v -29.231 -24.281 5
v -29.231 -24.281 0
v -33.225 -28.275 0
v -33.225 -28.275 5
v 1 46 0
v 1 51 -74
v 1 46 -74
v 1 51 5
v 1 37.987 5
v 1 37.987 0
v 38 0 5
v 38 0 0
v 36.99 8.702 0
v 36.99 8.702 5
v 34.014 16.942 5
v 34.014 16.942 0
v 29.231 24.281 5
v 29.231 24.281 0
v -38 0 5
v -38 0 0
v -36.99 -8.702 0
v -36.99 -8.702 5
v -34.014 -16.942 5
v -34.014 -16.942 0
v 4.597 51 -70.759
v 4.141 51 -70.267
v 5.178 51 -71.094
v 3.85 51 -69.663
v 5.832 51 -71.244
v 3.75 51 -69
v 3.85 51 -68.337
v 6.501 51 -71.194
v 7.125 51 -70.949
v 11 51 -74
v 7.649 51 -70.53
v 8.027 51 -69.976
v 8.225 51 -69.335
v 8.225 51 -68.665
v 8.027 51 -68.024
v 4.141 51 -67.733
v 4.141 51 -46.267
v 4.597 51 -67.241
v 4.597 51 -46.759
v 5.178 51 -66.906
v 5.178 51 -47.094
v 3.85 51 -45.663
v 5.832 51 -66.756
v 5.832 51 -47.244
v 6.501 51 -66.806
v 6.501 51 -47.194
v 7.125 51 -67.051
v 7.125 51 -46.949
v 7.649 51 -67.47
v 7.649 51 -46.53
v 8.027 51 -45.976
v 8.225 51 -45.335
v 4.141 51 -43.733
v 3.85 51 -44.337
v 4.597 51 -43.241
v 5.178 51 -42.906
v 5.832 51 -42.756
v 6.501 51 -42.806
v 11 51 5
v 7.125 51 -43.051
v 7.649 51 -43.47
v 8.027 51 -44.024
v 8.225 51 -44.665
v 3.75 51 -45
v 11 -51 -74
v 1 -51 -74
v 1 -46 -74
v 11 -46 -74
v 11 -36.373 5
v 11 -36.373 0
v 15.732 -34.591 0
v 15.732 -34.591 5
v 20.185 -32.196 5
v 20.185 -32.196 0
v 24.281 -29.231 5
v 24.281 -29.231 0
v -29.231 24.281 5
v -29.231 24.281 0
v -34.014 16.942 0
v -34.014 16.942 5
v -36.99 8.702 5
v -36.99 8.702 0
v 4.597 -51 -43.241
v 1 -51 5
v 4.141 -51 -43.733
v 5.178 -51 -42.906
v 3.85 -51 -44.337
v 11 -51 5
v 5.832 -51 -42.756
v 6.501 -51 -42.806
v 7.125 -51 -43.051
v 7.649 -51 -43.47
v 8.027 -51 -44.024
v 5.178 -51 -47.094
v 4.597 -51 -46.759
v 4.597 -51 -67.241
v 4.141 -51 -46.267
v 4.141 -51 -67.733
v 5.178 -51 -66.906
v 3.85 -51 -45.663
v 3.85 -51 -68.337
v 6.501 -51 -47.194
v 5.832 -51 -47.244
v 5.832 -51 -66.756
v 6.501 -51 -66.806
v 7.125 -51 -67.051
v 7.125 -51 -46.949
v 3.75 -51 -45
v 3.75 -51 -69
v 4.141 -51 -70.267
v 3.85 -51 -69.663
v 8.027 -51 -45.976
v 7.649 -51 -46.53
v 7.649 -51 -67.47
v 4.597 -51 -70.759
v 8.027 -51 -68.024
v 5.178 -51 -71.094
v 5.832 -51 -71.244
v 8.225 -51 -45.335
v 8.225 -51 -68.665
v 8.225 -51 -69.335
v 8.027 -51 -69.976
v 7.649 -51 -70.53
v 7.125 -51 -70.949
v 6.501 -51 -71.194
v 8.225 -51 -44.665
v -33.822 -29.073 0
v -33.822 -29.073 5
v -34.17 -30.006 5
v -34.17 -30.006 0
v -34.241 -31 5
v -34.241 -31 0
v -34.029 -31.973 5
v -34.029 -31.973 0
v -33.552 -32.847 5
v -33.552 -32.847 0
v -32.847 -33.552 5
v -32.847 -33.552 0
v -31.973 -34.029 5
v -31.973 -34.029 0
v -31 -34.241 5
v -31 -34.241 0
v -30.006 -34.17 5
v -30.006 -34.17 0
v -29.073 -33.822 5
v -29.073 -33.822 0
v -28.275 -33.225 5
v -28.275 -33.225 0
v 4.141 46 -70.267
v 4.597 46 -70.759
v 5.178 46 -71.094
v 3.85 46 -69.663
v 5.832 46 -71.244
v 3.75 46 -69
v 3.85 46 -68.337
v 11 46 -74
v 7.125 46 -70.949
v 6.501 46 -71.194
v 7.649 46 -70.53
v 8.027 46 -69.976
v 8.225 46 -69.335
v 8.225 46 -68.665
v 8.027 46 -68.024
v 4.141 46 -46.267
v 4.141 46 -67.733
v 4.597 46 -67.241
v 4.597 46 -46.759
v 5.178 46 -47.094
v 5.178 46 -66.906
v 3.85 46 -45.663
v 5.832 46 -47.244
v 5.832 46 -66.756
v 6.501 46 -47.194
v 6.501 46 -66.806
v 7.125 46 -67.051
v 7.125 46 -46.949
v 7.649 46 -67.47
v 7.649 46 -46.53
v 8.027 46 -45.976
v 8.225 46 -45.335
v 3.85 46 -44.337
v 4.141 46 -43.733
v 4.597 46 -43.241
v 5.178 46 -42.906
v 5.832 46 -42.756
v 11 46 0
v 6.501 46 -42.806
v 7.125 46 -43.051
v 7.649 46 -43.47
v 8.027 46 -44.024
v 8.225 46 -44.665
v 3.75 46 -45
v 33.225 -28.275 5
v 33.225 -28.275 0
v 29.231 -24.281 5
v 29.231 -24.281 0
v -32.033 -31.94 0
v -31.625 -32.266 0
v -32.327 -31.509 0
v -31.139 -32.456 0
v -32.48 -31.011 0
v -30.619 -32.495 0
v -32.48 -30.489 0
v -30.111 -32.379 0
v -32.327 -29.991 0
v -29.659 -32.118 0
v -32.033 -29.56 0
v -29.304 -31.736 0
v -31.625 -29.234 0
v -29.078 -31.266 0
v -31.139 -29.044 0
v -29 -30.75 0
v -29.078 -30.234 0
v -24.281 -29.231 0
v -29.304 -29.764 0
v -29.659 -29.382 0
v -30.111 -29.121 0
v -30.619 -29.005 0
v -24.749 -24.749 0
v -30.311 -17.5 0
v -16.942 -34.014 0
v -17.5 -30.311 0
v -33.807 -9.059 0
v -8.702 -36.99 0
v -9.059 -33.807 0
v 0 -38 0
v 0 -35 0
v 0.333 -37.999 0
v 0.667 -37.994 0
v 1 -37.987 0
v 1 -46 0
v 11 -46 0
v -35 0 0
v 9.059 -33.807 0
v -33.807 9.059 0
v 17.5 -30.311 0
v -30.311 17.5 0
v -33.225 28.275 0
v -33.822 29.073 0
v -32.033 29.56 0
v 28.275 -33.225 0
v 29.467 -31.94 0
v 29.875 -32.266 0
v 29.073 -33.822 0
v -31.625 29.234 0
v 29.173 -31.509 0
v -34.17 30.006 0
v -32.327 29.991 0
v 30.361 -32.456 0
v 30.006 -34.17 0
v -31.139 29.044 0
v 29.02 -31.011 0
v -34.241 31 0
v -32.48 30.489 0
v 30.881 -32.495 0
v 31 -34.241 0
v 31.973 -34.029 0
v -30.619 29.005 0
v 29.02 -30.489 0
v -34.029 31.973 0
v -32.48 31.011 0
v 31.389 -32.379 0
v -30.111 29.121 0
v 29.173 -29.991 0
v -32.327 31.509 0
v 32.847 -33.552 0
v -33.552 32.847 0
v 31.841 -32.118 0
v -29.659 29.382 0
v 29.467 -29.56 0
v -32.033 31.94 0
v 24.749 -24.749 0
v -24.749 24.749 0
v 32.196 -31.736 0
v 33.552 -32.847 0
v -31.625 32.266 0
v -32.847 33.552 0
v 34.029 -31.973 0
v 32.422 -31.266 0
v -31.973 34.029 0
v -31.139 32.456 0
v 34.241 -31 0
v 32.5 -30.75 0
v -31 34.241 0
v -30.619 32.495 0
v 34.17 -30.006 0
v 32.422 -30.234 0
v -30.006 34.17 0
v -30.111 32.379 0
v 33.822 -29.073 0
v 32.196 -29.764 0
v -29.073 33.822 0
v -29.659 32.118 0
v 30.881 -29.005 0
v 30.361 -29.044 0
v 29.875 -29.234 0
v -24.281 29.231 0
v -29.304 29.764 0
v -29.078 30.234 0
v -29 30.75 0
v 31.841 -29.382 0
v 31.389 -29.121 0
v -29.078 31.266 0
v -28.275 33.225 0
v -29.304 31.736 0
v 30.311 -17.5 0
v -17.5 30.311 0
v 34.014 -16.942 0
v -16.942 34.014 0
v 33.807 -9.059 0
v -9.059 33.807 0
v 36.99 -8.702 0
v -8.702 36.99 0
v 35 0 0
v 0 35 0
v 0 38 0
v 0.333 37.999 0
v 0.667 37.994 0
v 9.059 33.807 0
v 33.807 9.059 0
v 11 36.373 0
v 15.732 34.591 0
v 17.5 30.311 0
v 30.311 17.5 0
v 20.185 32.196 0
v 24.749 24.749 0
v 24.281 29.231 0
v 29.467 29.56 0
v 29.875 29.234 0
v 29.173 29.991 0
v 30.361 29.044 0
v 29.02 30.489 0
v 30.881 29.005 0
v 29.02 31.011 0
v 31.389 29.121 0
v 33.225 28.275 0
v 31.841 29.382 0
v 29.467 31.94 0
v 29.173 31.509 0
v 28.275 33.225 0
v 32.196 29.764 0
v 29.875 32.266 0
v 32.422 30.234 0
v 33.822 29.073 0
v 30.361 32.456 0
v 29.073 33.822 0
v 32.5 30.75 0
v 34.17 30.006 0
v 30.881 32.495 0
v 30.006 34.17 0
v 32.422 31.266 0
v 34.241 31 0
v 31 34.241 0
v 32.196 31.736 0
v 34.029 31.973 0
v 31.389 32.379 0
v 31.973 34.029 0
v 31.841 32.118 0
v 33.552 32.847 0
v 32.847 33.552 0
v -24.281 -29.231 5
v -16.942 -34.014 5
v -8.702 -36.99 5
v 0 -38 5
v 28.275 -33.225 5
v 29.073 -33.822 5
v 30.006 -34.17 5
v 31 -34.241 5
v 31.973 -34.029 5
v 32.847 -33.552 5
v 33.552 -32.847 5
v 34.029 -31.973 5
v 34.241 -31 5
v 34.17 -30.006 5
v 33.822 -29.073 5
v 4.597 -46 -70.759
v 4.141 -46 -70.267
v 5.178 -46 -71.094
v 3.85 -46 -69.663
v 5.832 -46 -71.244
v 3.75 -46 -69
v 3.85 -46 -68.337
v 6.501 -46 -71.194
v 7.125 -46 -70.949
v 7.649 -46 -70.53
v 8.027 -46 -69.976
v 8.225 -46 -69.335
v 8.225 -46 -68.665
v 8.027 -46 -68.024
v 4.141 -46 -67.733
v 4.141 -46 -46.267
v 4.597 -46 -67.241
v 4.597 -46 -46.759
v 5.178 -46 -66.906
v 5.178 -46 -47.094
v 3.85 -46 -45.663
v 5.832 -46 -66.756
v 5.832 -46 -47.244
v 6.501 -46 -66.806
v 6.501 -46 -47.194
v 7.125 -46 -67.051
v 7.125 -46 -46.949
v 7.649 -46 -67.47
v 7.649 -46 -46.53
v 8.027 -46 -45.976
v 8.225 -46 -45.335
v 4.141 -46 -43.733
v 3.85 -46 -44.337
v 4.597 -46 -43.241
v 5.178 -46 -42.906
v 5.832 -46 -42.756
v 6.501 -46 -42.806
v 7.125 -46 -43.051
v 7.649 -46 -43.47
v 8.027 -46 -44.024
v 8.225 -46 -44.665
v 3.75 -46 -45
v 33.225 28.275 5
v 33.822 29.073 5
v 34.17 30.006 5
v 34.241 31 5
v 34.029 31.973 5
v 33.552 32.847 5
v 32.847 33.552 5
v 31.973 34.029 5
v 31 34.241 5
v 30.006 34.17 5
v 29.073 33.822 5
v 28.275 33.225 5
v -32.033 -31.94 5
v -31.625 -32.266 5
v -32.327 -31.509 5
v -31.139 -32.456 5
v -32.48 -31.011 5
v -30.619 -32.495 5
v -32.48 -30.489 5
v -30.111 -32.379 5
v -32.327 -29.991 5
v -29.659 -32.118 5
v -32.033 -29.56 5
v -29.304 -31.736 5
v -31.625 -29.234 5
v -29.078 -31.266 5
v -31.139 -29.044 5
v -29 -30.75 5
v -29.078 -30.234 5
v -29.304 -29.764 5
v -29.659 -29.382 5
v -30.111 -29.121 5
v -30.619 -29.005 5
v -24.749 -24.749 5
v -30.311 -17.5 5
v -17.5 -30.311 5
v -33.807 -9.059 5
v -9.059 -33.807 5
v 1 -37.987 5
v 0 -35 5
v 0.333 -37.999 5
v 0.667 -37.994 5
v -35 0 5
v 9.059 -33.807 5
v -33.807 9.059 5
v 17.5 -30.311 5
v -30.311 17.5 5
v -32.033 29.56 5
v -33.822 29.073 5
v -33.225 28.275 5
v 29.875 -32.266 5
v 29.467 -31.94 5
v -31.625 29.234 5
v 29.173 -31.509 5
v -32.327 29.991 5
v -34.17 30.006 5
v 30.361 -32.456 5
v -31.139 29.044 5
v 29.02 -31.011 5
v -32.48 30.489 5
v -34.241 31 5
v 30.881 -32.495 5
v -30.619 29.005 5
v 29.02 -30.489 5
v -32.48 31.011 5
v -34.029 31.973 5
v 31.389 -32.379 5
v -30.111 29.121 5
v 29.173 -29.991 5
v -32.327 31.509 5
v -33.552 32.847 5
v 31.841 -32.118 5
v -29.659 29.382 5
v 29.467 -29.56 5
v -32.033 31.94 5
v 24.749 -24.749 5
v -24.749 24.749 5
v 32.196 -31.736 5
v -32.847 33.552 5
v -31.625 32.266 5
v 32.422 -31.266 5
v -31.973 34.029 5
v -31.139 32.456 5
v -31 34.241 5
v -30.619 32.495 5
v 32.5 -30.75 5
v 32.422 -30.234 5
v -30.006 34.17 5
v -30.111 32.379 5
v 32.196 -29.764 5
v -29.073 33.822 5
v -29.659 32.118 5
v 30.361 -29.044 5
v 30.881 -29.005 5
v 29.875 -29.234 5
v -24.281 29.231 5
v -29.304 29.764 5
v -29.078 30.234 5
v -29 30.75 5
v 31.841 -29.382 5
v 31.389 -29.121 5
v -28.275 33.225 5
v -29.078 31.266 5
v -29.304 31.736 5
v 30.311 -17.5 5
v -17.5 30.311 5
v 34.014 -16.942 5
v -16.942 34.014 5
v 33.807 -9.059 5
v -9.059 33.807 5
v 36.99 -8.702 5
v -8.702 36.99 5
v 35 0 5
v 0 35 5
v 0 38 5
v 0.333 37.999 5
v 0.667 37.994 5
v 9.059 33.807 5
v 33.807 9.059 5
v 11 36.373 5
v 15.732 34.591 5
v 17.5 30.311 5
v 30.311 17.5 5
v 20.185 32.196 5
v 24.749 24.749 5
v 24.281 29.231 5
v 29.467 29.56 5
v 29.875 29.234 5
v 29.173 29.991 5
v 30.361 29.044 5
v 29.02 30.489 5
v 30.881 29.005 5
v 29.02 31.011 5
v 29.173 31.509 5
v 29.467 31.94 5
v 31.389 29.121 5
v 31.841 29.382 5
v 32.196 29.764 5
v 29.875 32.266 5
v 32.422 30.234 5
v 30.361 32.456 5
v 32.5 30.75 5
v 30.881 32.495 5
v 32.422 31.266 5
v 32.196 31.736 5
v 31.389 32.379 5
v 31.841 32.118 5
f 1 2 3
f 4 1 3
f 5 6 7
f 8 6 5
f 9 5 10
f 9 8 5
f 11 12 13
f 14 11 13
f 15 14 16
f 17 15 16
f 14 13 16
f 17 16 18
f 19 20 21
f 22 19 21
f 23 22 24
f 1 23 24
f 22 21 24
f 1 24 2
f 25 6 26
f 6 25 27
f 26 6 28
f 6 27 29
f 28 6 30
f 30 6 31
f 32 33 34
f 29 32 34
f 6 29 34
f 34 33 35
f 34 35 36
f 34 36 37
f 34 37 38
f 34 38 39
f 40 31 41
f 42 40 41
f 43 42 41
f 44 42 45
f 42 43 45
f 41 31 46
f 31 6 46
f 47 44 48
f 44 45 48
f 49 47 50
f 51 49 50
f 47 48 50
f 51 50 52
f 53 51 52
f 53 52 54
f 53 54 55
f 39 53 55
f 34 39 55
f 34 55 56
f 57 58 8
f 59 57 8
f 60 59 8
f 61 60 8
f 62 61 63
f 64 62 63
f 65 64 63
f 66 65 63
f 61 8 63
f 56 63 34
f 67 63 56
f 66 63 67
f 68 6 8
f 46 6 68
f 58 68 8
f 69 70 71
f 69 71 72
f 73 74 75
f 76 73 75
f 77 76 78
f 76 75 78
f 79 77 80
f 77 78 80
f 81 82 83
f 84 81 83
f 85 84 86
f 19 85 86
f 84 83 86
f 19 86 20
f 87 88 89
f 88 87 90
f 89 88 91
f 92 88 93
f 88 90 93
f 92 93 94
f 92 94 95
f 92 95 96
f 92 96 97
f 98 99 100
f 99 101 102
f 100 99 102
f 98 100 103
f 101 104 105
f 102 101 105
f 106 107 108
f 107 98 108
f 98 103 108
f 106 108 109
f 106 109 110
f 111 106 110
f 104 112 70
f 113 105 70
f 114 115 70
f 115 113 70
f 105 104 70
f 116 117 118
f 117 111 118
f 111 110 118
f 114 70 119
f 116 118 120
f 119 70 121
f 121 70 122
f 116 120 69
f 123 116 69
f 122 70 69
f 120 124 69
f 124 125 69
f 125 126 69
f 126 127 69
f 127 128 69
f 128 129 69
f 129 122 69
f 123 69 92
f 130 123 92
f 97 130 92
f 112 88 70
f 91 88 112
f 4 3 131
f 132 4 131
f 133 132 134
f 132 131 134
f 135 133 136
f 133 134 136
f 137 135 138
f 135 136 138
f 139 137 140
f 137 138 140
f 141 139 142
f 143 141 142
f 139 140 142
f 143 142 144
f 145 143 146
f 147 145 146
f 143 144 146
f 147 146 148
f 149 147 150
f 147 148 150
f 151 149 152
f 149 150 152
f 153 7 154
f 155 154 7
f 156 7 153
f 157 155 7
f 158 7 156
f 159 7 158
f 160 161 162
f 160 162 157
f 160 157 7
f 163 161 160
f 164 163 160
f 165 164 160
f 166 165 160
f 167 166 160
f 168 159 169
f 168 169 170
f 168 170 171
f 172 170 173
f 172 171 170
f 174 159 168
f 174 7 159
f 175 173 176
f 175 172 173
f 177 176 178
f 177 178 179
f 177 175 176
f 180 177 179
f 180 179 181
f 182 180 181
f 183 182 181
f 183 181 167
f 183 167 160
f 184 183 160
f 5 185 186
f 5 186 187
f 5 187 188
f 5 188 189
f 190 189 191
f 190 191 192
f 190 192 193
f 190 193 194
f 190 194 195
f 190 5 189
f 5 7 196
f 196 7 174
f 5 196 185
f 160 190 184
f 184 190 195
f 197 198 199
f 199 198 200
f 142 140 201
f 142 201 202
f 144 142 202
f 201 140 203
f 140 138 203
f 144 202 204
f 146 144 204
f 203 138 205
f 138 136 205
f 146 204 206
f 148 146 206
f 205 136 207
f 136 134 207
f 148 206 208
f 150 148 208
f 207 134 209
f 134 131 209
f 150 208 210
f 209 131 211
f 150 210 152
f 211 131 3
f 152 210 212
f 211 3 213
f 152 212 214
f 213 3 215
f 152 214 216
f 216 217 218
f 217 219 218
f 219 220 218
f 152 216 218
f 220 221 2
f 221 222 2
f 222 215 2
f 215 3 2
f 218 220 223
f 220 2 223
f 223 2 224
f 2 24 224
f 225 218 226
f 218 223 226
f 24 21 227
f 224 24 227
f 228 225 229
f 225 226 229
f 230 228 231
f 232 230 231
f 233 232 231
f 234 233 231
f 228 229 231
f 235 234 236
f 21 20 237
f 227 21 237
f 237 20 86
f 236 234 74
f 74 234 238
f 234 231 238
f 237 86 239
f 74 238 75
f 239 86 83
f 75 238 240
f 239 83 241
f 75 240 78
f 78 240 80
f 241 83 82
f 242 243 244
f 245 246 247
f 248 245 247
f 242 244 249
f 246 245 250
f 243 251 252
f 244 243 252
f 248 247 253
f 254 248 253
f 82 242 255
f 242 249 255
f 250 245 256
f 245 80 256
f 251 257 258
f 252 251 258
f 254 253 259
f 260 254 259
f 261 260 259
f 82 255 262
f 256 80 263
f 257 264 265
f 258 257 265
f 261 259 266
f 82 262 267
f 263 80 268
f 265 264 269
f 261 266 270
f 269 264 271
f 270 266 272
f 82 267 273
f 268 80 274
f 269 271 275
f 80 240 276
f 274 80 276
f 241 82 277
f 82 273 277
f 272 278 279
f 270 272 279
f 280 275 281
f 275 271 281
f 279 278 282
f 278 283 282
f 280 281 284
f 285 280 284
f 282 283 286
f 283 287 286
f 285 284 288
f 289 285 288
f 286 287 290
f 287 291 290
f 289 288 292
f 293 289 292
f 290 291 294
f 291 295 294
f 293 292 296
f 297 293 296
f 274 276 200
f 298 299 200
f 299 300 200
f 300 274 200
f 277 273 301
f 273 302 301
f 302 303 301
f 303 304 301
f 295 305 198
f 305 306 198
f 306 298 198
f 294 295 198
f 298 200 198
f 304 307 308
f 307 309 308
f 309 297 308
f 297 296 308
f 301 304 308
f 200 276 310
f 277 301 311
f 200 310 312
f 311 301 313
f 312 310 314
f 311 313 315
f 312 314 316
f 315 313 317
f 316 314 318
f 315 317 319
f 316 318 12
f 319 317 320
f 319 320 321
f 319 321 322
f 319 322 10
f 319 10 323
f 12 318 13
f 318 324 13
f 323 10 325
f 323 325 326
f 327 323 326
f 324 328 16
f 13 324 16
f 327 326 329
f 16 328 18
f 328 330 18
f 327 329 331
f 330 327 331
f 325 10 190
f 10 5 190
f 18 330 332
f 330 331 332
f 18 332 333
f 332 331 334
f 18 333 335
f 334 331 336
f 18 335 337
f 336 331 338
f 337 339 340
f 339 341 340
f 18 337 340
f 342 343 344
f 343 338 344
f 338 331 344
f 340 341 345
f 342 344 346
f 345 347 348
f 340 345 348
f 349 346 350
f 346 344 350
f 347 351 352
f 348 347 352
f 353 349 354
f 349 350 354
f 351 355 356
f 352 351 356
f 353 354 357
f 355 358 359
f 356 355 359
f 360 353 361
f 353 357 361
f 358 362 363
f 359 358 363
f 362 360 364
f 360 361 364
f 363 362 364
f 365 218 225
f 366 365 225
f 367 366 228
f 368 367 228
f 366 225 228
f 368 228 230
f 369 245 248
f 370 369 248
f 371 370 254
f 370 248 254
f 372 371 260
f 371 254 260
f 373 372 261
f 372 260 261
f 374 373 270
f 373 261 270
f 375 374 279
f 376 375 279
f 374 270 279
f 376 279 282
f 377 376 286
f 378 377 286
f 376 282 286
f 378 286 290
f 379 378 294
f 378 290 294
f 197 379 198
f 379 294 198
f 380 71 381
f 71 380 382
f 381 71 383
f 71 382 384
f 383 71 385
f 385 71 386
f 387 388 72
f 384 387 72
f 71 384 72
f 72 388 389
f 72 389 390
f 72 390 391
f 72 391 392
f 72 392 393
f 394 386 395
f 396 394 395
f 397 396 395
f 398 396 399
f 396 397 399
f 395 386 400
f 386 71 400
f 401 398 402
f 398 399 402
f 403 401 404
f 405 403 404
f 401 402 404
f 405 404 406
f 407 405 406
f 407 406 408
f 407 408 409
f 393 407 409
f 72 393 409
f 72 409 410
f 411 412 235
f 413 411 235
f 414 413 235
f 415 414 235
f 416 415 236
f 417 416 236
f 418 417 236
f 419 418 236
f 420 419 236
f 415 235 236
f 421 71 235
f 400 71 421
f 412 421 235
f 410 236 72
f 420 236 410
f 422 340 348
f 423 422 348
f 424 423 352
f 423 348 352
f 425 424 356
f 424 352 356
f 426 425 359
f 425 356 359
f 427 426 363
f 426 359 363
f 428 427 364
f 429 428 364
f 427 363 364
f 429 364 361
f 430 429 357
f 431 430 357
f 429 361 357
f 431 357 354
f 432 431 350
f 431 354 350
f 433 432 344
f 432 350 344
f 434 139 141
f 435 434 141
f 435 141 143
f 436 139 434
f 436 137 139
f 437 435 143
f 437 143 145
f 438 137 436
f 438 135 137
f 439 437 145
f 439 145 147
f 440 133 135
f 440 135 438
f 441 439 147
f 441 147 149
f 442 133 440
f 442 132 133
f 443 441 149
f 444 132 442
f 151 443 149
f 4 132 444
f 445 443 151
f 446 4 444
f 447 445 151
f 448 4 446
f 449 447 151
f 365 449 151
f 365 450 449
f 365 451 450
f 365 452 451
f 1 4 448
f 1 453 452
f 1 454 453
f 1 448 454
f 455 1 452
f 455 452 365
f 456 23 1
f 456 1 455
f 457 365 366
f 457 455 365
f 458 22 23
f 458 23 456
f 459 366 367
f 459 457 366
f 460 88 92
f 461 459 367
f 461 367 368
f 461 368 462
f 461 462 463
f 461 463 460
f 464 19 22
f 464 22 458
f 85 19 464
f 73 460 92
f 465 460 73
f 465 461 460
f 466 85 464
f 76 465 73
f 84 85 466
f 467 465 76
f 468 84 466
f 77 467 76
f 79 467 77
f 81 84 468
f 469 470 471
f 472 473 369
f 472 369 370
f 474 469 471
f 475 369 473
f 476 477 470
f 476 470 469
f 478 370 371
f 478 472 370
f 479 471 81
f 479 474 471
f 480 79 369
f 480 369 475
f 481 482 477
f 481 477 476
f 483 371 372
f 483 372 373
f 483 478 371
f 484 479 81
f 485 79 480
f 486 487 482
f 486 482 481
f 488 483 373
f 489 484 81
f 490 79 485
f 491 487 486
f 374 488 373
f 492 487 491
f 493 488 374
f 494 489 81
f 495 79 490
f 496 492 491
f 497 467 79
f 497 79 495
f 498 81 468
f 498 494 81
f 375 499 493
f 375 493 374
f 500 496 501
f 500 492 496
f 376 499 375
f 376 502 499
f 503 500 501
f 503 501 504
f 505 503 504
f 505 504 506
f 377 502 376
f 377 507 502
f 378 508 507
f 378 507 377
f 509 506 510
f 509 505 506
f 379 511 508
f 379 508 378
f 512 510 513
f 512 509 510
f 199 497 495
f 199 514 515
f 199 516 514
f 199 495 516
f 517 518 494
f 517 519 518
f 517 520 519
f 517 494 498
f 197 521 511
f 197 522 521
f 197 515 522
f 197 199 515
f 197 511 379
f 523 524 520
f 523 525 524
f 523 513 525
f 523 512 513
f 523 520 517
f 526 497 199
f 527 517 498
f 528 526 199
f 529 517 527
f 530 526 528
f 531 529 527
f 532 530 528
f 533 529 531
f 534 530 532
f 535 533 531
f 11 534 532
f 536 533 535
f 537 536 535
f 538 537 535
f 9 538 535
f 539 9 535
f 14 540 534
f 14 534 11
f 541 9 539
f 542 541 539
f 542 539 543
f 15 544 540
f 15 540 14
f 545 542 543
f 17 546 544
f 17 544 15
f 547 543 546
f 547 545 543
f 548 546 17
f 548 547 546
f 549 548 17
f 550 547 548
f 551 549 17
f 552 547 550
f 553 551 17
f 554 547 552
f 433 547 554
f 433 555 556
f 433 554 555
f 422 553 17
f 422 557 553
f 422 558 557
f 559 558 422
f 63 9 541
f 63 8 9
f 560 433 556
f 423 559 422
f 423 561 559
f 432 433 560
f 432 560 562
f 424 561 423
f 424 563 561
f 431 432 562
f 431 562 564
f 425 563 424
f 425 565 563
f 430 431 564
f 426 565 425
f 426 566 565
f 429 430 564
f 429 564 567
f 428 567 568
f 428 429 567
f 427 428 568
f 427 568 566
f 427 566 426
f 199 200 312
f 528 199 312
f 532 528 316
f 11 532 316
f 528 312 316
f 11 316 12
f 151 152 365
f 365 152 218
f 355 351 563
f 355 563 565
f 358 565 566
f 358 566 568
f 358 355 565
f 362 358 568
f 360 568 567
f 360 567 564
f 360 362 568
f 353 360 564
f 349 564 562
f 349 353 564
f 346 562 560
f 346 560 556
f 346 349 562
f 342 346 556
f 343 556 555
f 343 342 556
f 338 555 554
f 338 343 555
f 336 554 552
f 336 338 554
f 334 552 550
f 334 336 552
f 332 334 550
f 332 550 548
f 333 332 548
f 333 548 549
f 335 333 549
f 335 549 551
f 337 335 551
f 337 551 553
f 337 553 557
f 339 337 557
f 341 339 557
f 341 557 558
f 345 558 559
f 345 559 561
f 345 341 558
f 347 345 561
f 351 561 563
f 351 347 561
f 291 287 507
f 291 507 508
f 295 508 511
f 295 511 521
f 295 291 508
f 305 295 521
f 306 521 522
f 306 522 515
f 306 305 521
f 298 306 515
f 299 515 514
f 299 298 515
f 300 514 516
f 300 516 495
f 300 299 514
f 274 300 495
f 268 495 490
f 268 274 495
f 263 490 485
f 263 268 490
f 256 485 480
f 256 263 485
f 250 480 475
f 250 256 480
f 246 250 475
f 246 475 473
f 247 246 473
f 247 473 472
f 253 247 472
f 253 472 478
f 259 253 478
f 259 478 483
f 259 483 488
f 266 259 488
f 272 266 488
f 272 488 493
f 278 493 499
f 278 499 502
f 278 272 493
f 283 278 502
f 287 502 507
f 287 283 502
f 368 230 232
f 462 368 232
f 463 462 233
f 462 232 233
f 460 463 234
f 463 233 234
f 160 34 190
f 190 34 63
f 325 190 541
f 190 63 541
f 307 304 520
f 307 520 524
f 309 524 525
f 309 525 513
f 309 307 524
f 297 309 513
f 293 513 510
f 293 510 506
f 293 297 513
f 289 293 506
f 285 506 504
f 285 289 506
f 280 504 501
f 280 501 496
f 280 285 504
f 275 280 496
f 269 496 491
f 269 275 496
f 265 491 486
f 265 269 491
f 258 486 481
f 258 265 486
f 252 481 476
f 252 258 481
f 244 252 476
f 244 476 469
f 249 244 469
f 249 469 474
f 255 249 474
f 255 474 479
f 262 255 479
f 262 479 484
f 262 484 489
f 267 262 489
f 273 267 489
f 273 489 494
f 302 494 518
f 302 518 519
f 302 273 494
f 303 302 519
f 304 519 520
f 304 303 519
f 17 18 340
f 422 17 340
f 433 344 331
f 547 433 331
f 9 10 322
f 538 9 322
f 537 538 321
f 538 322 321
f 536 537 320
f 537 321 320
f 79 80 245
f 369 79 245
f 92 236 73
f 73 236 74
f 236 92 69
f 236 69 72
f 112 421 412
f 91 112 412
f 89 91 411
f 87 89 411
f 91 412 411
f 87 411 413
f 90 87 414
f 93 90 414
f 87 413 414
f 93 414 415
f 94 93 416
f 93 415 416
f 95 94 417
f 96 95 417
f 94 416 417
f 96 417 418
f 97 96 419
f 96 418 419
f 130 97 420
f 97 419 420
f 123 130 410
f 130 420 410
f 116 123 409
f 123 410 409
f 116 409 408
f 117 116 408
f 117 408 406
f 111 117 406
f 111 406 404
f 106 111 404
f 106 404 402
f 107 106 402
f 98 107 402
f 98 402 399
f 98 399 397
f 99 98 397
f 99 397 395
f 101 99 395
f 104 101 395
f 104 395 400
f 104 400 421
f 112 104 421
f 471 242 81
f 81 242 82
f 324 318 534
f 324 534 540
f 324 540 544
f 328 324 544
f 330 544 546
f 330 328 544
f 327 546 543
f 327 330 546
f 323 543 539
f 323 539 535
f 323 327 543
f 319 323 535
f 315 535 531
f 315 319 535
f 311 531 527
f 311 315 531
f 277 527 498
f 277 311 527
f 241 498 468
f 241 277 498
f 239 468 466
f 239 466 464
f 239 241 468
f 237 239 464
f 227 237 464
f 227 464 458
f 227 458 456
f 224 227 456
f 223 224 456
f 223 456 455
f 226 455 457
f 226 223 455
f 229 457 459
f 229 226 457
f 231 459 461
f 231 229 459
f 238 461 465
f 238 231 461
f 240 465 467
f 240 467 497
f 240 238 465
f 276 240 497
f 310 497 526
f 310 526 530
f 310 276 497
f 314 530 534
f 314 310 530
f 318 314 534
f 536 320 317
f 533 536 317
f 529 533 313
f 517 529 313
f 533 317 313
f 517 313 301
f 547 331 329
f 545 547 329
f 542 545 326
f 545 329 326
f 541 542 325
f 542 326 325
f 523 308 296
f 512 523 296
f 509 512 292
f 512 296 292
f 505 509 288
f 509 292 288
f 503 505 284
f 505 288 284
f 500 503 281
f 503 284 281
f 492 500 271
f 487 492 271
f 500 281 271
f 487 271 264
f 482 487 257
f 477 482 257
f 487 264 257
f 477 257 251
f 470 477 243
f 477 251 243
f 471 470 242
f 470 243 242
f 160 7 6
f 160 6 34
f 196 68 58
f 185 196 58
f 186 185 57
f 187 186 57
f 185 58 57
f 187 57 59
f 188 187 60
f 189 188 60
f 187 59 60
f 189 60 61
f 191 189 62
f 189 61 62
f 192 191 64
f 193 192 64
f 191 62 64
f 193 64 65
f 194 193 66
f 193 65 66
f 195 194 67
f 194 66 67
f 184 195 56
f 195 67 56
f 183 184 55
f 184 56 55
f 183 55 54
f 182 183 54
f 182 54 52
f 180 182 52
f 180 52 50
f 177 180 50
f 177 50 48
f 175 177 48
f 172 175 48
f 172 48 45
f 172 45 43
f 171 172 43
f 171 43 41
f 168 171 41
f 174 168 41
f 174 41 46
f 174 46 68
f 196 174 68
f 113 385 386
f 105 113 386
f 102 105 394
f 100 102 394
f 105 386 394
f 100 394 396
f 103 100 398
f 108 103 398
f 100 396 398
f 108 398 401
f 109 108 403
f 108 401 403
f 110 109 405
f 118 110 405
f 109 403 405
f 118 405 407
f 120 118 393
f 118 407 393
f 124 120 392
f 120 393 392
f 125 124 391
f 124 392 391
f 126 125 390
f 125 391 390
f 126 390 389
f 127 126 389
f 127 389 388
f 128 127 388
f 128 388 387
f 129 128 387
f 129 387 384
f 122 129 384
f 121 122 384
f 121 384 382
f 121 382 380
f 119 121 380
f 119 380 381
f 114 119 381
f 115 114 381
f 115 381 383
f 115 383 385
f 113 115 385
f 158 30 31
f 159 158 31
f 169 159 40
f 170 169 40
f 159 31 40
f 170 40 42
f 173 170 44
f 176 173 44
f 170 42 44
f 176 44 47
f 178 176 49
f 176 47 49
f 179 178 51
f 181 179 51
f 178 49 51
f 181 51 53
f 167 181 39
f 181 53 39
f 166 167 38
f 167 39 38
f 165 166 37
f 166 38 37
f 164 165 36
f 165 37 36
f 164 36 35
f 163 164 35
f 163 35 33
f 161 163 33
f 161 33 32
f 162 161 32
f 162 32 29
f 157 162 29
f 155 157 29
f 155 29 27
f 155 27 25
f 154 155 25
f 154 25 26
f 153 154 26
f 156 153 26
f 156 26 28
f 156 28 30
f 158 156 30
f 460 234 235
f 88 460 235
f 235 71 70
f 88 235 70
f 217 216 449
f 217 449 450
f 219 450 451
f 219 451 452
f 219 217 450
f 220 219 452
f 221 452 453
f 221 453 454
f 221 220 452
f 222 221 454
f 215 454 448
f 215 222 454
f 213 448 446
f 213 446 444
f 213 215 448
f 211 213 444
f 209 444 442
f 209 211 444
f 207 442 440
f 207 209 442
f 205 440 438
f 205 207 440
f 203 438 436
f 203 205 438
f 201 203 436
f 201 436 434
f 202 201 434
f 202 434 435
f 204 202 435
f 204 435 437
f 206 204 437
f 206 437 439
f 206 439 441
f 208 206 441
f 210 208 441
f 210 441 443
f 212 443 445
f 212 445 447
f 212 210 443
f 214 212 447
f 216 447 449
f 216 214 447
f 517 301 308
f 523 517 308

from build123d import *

# Parameters (mm, degrees)
F0_R     = 1.75
F0_R_2   = 35
F1_DEPTH = 5
F2_W     = 10
F2_H     = 5
F3_DEPTH = 74
F4_R     = 2.25
F5_DEPTH = 102.001


with BuildPart() as f1:
    # F0 (on Top) → F1 (new body)
    with BuildSketch(Plane.XY):
        with BuildLine():
            Line((-24.280967, 29.230714), (-28.275126, 33.224874))
            ThreePointArc((-28.275126, 33.224874), (-33.224874, 33.224874), (-33.224874, 28.275126))
            Line((-33.224874, 28.275126), (-29.230714, 24.280967))
            ThreePointArc((-29.230714, 24.280967), (-35.740503, 12.907999), (-38, 0))
            ThreePointArc((-38, 0), (-35.740503, -12.907999), (-29.230714, -24.280967))
            Line((-29.230714, -24.280967), (-33.224874, -28.275126))
            ThreePointArc((-33.224874, -28.275126), (-33.224874, -33.224874), (-28.275126, -33.224874))
            Line((-28.275126, -33.224874), (-24.280967, -29.230714))
            ThreePointArc((-24.280967, -29.230714), (-12.907999, -35.740503), (0, -38))
            ThreePointArc((0, -38), (0.500043, -37.99671), (1, -37.98684))
            ThreePointArc((1, -37.98684), (6.054012, -37.51465), (11, -36.373067))
            ThreePointArc((11, -36.373067), (17.998332, -33.467298), (24.280967, -29.230714))
            Line((24.280967, -29.230714), (28.275126, -33.224874))
            ThreePointArc((28.275126, -33.224874), (33.224874, -33.224874), (33.224874, -28.275126))
            Line((33.224874, -28.275126), (29.230714, -24.280967))
            ThreePointArc((29.230714, -24.280967), (35.740503, -12.907999), (38, 0))
            ThreePointArc((38, 0), (35.740503, 12.907999), (29.230714, 24.280967))
            Line((29.230714, 24.280967), (33.224874, 28.275126))
            ThreePointArc((33.224874, 28.275126), (33.224874, 33.224874), (28.275126, 33.224874))
            Line((28.275126, 33.224874), (24.280967, 29.230714))
            ThreePointArc((24.280967, 29.230714), (17.998332, 33.467298), (11, 36.373067))
            ThreePointArc((11, 36.373067), (6.054012, 37.51465), (1, 37.98684))
            ThreePointArc((1, 37.98684), (0.500043, 37.99671), (0, 38))
            ThreePointArc((0, 38), (-12.907999, 35.740503), (-24.280967, 29.230714))
        make_face()
        with Locations((-30.75, -30.75)):
            Circle(F0_R, mode=Mode.SUBTRACT)
        with Locations((30.75, -30.75)):
            Circle(F0_R, mode=Mode.SUBTRACT)
        with Locations((-30.75, 30.75)):
            Circle(F0_R, mode=Mode.SUBTRACT)
        Circle(F0_R_2, mode=Mode.SUBTRACT)
        with Locations((30.75, 30.75)):
            Circle(F0_R, mode=Mode.SUBTRACT)
        with BuildLine():
            Line((1, 51), (1, 37.98684))
            ThreePointArc((1, 37.98684), (6.054012, 37.51465), (11, 36.373067))
            Line((11, 36.373067), (11, 51))
            Line((11, 51), (1, 51))
        make_face()
        with BuildLine():
            ThreePointArc((11, -36.373067), (6.054012, -37.51465), (1, -37.98684))
            Line((1, -37.98684), (1, -51))
            Line((1, -51), (11, -51))
            Line((11, -51), (11, -36.373067))
        make_face()
    extrude(amount=F1_DEPTH)

    # F2 (on face) → F3 (join)
    with BuildSketch(Plane(origin=(0, 0, 0), x_dir=(1, 0, 0), z_dir=(0, 0, -1))):
        with Locations((6, -48.5)):
            Rectangle(F2_W, F2_H)
        with Locations((6, 48.5)):
            Rectangle(F2_W, F2_H)
    extrude(amount=F3_DEPTH)

    # F4 (on face) → F5 (cut, through all)
    with BuildSketch(Plane(origin=(0, 51, 0), x_dir=(-1, 0, 0), z_dir=(0, 1, 0))):
        with Locations((-6, -69)):
            Circle(F4_R)
        with Locations((-6, -45)):
            Circle(F4_R)
    extrude(amount=-F5_DEPTH, mode=Mode.SUBTRACT)


solid = f1.part
